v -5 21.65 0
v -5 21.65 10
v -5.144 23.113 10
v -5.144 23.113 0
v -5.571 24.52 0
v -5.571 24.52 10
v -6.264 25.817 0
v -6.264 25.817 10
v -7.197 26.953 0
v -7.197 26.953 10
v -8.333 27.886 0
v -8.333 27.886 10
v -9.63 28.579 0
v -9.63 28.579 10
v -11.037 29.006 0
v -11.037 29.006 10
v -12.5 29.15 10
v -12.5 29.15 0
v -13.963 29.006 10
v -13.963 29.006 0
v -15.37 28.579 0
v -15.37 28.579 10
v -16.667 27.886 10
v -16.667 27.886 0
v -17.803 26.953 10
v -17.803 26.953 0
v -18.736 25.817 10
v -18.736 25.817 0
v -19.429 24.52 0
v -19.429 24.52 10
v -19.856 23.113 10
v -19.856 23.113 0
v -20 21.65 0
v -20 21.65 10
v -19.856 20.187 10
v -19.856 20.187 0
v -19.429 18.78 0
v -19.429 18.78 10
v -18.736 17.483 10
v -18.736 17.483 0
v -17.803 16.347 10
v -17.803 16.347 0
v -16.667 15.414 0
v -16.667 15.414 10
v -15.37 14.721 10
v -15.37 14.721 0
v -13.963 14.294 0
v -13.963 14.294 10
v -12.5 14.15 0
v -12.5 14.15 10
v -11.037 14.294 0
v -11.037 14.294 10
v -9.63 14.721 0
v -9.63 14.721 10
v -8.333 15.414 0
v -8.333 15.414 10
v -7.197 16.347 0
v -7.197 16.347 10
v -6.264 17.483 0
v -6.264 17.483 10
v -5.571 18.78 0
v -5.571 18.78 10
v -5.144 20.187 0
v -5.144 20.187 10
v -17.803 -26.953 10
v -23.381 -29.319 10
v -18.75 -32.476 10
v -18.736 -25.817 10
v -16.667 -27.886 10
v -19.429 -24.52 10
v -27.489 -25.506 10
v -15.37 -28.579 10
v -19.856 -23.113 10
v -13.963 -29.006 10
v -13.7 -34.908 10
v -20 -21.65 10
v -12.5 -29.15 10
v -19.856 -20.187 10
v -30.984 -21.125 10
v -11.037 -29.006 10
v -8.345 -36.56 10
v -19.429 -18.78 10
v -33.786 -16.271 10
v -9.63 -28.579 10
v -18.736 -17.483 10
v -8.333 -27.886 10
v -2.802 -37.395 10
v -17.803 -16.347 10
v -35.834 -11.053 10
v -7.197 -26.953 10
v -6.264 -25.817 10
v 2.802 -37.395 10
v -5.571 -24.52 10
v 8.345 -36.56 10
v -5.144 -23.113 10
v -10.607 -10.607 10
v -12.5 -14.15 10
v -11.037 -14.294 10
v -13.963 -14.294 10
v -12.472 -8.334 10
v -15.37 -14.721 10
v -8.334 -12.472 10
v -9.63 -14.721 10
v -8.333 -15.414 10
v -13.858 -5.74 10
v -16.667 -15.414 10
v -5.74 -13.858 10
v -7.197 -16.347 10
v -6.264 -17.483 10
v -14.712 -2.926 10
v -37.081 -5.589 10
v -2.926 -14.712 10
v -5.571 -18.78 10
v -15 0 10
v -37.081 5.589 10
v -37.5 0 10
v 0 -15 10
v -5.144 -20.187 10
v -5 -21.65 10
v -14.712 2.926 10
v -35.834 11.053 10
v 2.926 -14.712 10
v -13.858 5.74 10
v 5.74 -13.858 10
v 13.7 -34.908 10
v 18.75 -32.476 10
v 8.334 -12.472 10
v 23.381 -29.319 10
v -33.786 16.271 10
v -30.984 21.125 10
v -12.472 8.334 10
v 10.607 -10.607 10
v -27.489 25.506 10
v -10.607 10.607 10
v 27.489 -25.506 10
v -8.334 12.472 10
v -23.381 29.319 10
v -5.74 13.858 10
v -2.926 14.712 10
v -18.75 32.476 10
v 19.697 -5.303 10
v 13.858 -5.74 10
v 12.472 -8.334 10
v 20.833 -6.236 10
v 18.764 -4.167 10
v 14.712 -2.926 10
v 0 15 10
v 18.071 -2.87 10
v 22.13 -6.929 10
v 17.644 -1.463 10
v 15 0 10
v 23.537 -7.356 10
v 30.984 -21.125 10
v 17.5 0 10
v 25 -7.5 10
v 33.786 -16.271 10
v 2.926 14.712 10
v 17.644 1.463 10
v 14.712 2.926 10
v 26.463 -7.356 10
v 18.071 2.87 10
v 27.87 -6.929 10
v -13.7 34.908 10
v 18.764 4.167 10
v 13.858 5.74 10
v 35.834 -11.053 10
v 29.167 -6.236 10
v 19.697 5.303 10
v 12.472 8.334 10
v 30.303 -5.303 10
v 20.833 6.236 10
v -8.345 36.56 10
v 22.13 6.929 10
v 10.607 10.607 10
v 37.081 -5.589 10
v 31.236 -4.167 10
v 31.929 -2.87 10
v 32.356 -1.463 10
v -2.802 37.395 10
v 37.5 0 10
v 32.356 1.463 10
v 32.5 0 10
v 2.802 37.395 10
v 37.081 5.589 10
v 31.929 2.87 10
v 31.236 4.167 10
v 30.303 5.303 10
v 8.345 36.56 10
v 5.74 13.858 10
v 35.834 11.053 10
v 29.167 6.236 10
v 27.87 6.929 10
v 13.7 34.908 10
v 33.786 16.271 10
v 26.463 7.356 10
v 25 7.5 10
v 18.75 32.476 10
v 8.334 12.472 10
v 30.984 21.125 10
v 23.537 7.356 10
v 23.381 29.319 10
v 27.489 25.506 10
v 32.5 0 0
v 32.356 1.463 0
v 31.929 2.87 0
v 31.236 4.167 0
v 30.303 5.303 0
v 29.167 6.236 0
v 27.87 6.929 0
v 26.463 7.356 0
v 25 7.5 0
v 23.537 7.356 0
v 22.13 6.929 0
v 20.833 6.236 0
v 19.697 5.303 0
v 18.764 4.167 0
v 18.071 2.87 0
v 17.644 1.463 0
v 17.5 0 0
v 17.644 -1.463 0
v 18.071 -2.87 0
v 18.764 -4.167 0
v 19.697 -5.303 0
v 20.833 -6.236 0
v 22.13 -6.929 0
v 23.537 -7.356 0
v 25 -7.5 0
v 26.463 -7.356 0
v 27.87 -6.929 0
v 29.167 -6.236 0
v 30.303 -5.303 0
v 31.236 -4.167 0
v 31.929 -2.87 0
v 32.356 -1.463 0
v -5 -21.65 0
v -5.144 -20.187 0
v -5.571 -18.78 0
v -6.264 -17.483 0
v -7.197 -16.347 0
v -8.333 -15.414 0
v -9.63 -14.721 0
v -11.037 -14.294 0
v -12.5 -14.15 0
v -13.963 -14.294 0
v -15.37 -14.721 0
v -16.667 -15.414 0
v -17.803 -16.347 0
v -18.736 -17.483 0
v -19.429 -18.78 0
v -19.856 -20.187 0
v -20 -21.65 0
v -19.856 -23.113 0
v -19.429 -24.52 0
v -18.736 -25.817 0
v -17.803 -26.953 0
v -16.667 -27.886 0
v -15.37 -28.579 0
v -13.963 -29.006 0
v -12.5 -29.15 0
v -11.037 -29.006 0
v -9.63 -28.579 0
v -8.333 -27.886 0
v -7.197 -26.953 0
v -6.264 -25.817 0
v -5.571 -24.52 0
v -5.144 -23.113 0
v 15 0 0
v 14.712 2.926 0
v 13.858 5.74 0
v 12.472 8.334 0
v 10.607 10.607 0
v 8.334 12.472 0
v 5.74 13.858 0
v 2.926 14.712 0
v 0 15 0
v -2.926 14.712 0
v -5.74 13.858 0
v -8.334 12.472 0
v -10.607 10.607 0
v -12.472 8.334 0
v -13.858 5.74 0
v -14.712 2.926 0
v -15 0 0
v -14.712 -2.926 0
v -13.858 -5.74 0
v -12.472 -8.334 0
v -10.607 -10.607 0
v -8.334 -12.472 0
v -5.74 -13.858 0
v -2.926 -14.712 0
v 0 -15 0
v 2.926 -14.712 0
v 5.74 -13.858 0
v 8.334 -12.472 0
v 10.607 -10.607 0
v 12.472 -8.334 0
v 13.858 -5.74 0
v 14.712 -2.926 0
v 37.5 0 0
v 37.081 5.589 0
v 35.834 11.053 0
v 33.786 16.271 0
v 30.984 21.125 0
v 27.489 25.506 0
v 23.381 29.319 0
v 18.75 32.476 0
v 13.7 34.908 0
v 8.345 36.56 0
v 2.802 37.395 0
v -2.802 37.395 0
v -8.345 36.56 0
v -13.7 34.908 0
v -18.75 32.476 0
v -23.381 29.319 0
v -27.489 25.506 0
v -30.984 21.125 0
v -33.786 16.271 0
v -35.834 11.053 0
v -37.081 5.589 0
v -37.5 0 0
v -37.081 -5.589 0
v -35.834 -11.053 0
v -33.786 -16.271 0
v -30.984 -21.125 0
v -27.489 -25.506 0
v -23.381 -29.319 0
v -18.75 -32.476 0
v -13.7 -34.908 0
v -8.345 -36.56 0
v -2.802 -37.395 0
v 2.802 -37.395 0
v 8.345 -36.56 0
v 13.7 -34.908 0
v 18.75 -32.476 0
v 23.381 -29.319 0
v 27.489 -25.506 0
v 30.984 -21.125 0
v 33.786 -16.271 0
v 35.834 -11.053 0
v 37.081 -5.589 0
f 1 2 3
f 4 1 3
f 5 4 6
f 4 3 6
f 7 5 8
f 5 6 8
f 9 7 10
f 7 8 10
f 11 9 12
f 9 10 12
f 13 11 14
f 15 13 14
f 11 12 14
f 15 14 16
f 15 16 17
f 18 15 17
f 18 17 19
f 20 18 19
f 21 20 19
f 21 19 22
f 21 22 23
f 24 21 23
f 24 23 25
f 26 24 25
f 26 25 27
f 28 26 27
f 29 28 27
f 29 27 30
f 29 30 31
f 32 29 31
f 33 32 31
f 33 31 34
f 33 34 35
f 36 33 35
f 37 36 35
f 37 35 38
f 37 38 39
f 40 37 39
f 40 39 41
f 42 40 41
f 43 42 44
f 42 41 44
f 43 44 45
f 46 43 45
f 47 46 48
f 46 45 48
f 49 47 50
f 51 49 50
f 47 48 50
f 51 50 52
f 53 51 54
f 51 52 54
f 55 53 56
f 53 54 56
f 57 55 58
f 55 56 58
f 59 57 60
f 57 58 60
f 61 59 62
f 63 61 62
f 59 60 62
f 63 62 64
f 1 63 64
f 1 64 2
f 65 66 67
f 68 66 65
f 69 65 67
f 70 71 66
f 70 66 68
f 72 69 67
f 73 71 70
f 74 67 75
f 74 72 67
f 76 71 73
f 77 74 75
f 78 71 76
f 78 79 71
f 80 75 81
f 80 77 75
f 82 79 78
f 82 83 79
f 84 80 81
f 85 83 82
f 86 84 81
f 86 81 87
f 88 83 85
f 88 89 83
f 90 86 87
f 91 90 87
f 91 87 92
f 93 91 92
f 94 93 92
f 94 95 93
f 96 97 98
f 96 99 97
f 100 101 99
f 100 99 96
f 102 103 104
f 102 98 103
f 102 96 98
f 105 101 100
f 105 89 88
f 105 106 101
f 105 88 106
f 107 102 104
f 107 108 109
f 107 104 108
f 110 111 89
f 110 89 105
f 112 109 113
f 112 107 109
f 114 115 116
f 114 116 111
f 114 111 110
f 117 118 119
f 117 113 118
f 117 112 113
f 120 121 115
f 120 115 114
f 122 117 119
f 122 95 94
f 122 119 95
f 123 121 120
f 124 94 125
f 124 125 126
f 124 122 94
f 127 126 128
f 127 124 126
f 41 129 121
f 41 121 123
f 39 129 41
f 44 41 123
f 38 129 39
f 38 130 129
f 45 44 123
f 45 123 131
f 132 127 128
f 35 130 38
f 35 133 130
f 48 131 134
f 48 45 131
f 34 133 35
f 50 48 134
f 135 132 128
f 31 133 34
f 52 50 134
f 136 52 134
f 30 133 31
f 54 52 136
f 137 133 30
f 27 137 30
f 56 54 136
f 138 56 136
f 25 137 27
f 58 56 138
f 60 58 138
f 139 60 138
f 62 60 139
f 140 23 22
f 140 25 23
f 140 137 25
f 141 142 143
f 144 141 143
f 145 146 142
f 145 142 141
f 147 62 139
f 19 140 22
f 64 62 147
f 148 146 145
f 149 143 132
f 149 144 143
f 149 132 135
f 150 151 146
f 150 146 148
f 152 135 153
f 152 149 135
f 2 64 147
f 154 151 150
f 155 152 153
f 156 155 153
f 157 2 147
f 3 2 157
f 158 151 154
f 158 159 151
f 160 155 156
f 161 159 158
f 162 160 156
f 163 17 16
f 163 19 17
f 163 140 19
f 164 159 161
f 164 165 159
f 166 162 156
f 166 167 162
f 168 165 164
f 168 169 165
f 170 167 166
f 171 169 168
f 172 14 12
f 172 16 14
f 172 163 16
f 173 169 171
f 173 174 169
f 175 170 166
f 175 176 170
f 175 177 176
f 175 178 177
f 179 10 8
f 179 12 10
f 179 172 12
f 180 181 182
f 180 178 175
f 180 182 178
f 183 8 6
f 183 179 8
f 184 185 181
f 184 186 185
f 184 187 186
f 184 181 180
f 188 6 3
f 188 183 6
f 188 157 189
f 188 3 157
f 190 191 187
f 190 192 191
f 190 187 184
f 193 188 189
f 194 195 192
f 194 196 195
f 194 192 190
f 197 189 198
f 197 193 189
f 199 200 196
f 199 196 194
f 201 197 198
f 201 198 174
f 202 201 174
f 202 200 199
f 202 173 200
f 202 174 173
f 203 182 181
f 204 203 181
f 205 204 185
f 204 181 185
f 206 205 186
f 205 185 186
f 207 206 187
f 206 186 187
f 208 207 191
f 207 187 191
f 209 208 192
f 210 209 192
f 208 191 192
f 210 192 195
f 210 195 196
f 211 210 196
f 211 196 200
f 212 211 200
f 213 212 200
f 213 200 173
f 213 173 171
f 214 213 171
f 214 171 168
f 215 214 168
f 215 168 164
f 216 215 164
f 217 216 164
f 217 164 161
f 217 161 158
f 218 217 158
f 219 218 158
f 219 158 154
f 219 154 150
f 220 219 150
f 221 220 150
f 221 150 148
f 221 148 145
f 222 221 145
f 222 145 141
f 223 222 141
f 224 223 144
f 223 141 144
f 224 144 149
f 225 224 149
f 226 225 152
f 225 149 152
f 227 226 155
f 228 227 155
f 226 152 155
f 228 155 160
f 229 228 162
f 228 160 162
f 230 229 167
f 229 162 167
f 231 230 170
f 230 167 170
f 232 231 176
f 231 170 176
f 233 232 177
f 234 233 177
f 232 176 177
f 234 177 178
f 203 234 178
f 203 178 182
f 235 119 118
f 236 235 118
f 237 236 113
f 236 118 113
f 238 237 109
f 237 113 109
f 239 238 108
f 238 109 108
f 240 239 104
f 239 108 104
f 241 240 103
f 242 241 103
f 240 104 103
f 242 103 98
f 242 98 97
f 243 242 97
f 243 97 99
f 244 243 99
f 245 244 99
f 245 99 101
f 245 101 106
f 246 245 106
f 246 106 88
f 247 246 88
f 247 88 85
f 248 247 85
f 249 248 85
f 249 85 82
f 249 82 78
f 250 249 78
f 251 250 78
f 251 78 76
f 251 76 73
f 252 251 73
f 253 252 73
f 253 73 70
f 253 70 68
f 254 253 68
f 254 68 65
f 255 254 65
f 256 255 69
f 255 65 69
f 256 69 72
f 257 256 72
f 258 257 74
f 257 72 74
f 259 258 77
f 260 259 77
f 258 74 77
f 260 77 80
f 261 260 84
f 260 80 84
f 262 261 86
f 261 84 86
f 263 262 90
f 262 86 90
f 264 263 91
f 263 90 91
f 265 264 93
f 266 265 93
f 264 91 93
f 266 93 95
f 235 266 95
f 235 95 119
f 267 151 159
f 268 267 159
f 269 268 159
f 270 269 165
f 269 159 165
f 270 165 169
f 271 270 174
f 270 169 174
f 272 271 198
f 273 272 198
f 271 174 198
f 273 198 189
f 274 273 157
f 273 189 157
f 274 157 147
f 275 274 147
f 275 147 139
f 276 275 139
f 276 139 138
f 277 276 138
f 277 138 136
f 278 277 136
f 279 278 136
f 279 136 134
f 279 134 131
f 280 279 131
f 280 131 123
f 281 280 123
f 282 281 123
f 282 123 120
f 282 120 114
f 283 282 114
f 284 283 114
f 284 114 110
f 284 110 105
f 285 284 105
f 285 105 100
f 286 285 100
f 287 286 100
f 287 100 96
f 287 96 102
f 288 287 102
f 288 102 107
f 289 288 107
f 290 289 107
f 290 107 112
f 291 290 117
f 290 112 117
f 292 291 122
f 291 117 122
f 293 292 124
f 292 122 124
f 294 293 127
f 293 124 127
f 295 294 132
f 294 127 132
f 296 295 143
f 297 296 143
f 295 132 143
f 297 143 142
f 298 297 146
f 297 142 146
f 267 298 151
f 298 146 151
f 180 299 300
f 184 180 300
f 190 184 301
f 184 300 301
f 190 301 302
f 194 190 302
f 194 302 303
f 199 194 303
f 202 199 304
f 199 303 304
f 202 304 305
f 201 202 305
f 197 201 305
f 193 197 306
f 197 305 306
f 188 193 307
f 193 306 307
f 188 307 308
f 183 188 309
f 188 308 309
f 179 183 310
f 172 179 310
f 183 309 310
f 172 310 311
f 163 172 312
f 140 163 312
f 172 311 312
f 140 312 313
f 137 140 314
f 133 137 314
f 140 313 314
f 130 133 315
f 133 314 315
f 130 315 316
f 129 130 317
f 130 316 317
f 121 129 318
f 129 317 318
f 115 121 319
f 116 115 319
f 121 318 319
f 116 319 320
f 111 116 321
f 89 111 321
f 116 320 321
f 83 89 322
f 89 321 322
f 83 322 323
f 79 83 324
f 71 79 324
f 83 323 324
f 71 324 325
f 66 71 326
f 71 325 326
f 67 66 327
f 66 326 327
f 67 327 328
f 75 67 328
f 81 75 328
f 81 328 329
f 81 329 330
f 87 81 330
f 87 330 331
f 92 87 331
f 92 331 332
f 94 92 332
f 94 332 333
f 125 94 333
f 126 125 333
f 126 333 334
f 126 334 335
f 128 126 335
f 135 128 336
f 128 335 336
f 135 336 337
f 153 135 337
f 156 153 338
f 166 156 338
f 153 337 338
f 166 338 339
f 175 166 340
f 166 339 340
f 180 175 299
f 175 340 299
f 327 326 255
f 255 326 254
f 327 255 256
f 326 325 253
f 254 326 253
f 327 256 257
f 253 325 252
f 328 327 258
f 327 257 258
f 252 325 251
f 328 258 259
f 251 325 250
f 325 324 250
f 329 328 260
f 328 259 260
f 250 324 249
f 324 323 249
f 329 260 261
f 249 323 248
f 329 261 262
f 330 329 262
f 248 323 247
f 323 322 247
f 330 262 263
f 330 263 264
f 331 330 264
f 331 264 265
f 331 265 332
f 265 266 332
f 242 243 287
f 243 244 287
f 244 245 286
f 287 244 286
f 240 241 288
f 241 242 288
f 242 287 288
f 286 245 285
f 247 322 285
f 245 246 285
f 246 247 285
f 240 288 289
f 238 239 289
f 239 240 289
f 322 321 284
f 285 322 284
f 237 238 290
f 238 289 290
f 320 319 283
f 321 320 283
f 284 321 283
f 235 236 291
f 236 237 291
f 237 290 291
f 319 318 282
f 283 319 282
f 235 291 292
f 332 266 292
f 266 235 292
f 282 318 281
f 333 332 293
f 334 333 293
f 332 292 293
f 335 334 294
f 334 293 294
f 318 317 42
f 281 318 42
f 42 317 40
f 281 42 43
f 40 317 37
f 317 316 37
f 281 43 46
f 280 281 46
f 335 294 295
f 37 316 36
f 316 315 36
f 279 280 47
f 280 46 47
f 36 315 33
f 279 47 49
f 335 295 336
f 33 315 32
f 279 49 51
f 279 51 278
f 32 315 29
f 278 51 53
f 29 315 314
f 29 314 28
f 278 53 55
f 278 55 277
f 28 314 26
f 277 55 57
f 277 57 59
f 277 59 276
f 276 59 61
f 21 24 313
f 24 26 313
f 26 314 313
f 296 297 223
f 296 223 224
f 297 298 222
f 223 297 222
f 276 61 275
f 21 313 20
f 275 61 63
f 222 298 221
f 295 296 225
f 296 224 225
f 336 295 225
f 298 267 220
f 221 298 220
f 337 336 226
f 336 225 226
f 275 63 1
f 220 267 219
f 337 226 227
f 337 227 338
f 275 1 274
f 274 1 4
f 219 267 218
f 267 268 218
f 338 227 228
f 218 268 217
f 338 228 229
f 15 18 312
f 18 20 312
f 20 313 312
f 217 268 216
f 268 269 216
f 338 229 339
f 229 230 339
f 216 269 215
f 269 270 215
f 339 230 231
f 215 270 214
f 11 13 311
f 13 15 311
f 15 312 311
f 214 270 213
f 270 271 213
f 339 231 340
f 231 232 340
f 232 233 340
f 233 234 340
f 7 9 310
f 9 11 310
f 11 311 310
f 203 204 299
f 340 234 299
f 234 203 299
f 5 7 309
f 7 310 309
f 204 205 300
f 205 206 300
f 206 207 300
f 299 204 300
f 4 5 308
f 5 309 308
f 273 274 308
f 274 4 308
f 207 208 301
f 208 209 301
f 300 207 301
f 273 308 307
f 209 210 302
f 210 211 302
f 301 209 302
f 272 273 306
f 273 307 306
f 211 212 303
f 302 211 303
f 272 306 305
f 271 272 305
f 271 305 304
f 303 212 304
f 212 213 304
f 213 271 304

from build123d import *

# Parameters (mm, degrees)
SKETCH_1_R     = 37.5
PAD_1_DEPTH    = 10
SKETCH_2_R     = 15
POCKET_2_DEPTH = 10.001
SKETCH_3_R     = 7.5
POCKET_3_DEPTH = 10.001
SKETCH_4_R     = 4.5
POCKET_4_DEPTH = 10.001
SKETCH_5_R     = 7.5
POCKET_5_DEPTH = 10.001
SKETCH_6_R     = 4.5
POCKET_6_DEPTH = 10.001
SKETCH_7_R     = 7.5
POCKET_7_DEPTH = 10.001
SKETCH_8_R     = 4.5
POCKET_8_DEPTH = 10.001


with BuildPart() as part:
    # Sketch_1 → Pad_1 (new body)
    with BuildSketch(Plane.XY):
        Circle(SKETCH_1_R)
    extrude(amount=PAD_1_DEPTH)

    # Sketch_2 (on Face3 of Pad_1) → Pocket_2 (cut, through all)
    with BuildSketch(Plane.XY.offset(10)):
        Circle(SKETCH_2_R)
    extrude(amount=-POCKET_2_DEPTH, mode=Mode.SUBTRACT)

    # Sketch_3 (on Face3 of Pocket_2) → Pocket_3 (cut, through all)
    with BuildSketch(Plane.XY.offset(10)):
        with Locations((25, 0)):
            Circle(SKETCH_3_R)
    extrude(amount=-POCKET_3_DEPTH, mode=Mode.SUBTRACT)

    # Sketch_4 (on Face3 of Pocket_3) → Pocket_4 (cut, through all)
    with BuildSketch(Plane.XY.offset(10)):
        with Locations((25, 0)):
            Circle(SKETCH_4_R)
    extrude(amount=-POCKET_4_DEPTH, mode=Mode.SUBTRACT)

    # Sketch_5 (on Face3 of Pocket_4) → Pocket_5 (cut, through all)
    with BuildSketch(Plane.XY.offset(10)):
        with Locations((-12.5, 21.65)):
            Circle(SKETCH_5_R)
    extrude(amount=-POCKET_5_DEPTH, mode=Mode.SUBTRACT)

    # Sketch_6 (on Face3 of Pocket_5) → Pocket_6 (cut, through all)
    with BuildSketch(Plane.XY.offset(10)):
        with Locations((-12.5, 21.65)):
            Circle(SKETCH_6_R)
    extrude(amount=-POCKET_6_DEPTH, mode=Mode.SUBTRACT)

    # Sketch_7 (on Face3 of Pocket_6) → Pocket_7 (cut, through all)
    with BuildSketch(Plane.XY.offset(10)):
        with Locations((-12.5, -21.65)):
            Circle(SKETCH_7_R)
    extrude(amount=-POCKET_7_DEPTH, mode=Mode.SUBTRACT)

    # Sketch_8 (on Face3 of Pocket_7) → Pocket_8 (cut, through all)
    with BuildSketch(Plane.XY.offset(10)):
        with Locations((-12.5, -21.65)):
            Circle(SKETCH_8_R)
    extrude(amount=-POCKET_8_DEPTH, mode=Mode.SUBTRACT)


solid = part.part
